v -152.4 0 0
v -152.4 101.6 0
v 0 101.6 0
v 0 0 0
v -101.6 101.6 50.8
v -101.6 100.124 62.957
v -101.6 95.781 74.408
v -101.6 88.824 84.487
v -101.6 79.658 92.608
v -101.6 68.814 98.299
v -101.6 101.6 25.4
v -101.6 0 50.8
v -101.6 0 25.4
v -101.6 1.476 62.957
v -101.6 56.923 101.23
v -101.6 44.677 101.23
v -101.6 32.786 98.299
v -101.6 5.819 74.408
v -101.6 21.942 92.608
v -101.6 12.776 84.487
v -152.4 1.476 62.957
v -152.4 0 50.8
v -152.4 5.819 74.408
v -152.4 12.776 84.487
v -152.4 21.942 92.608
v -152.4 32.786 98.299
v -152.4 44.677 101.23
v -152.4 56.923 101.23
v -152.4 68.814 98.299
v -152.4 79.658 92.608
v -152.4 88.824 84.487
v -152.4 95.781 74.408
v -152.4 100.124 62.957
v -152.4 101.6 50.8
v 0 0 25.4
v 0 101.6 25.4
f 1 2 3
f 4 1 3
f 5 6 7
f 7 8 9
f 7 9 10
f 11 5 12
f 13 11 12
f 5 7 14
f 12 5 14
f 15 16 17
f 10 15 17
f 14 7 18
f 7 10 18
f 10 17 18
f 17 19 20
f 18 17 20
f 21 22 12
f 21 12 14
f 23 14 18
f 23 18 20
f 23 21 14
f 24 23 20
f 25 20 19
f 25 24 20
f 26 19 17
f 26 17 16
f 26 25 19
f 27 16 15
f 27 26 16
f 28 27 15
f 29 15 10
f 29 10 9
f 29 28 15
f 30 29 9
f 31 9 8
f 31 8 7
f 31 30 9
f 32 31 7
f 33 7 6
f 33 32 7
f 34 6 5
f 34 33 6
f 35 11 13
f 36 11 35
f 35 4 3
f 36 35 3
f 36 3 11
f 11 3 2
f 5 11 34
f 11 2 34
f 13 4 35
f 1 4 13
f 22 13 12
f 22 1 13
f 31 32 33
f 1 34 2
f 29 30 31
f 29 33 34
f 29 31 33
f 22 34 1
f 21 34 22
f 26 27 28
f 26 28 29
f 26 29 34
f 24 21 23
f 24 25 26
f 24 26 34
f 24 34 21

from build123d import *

# Parameters (mm, degrees)
F0_W     = 152.4
F0_H     = 101.6
F1_DEPTH = 25.4
F2_W     = 101.6
F2_H     = 25.4
F3_DEPTH = 50.8


with BuildPart() as f1:
    # F0 (on Top) → F1 (new body)
    with BuildSketch(Plane.XY):
        with Locations((-76.2, 50.8)):
            Rectangle(F0_W, F0_H)
    extrude(amount=F1_DEPTH)

    # F2 (on face) → F3 (join)
    with BuildSketch(Plane(origin=(-152.4, 0, 0), x_dir=(0, -1, 0), z_dir=(-1, 0, 0))):
        with Locations((-50.8, 38.1)):
            Rectangle(F2_W, F2_H)
        with BuildLine():
            ThreePointArc((0, 50.8), (-50.8, 101.6), (-101.6, 50.8))
            Line((-101.6, 50.8), (0, 50.8))
        make_face()
    extrude(amount=-F3_DEPTH)


solid = f1.part
